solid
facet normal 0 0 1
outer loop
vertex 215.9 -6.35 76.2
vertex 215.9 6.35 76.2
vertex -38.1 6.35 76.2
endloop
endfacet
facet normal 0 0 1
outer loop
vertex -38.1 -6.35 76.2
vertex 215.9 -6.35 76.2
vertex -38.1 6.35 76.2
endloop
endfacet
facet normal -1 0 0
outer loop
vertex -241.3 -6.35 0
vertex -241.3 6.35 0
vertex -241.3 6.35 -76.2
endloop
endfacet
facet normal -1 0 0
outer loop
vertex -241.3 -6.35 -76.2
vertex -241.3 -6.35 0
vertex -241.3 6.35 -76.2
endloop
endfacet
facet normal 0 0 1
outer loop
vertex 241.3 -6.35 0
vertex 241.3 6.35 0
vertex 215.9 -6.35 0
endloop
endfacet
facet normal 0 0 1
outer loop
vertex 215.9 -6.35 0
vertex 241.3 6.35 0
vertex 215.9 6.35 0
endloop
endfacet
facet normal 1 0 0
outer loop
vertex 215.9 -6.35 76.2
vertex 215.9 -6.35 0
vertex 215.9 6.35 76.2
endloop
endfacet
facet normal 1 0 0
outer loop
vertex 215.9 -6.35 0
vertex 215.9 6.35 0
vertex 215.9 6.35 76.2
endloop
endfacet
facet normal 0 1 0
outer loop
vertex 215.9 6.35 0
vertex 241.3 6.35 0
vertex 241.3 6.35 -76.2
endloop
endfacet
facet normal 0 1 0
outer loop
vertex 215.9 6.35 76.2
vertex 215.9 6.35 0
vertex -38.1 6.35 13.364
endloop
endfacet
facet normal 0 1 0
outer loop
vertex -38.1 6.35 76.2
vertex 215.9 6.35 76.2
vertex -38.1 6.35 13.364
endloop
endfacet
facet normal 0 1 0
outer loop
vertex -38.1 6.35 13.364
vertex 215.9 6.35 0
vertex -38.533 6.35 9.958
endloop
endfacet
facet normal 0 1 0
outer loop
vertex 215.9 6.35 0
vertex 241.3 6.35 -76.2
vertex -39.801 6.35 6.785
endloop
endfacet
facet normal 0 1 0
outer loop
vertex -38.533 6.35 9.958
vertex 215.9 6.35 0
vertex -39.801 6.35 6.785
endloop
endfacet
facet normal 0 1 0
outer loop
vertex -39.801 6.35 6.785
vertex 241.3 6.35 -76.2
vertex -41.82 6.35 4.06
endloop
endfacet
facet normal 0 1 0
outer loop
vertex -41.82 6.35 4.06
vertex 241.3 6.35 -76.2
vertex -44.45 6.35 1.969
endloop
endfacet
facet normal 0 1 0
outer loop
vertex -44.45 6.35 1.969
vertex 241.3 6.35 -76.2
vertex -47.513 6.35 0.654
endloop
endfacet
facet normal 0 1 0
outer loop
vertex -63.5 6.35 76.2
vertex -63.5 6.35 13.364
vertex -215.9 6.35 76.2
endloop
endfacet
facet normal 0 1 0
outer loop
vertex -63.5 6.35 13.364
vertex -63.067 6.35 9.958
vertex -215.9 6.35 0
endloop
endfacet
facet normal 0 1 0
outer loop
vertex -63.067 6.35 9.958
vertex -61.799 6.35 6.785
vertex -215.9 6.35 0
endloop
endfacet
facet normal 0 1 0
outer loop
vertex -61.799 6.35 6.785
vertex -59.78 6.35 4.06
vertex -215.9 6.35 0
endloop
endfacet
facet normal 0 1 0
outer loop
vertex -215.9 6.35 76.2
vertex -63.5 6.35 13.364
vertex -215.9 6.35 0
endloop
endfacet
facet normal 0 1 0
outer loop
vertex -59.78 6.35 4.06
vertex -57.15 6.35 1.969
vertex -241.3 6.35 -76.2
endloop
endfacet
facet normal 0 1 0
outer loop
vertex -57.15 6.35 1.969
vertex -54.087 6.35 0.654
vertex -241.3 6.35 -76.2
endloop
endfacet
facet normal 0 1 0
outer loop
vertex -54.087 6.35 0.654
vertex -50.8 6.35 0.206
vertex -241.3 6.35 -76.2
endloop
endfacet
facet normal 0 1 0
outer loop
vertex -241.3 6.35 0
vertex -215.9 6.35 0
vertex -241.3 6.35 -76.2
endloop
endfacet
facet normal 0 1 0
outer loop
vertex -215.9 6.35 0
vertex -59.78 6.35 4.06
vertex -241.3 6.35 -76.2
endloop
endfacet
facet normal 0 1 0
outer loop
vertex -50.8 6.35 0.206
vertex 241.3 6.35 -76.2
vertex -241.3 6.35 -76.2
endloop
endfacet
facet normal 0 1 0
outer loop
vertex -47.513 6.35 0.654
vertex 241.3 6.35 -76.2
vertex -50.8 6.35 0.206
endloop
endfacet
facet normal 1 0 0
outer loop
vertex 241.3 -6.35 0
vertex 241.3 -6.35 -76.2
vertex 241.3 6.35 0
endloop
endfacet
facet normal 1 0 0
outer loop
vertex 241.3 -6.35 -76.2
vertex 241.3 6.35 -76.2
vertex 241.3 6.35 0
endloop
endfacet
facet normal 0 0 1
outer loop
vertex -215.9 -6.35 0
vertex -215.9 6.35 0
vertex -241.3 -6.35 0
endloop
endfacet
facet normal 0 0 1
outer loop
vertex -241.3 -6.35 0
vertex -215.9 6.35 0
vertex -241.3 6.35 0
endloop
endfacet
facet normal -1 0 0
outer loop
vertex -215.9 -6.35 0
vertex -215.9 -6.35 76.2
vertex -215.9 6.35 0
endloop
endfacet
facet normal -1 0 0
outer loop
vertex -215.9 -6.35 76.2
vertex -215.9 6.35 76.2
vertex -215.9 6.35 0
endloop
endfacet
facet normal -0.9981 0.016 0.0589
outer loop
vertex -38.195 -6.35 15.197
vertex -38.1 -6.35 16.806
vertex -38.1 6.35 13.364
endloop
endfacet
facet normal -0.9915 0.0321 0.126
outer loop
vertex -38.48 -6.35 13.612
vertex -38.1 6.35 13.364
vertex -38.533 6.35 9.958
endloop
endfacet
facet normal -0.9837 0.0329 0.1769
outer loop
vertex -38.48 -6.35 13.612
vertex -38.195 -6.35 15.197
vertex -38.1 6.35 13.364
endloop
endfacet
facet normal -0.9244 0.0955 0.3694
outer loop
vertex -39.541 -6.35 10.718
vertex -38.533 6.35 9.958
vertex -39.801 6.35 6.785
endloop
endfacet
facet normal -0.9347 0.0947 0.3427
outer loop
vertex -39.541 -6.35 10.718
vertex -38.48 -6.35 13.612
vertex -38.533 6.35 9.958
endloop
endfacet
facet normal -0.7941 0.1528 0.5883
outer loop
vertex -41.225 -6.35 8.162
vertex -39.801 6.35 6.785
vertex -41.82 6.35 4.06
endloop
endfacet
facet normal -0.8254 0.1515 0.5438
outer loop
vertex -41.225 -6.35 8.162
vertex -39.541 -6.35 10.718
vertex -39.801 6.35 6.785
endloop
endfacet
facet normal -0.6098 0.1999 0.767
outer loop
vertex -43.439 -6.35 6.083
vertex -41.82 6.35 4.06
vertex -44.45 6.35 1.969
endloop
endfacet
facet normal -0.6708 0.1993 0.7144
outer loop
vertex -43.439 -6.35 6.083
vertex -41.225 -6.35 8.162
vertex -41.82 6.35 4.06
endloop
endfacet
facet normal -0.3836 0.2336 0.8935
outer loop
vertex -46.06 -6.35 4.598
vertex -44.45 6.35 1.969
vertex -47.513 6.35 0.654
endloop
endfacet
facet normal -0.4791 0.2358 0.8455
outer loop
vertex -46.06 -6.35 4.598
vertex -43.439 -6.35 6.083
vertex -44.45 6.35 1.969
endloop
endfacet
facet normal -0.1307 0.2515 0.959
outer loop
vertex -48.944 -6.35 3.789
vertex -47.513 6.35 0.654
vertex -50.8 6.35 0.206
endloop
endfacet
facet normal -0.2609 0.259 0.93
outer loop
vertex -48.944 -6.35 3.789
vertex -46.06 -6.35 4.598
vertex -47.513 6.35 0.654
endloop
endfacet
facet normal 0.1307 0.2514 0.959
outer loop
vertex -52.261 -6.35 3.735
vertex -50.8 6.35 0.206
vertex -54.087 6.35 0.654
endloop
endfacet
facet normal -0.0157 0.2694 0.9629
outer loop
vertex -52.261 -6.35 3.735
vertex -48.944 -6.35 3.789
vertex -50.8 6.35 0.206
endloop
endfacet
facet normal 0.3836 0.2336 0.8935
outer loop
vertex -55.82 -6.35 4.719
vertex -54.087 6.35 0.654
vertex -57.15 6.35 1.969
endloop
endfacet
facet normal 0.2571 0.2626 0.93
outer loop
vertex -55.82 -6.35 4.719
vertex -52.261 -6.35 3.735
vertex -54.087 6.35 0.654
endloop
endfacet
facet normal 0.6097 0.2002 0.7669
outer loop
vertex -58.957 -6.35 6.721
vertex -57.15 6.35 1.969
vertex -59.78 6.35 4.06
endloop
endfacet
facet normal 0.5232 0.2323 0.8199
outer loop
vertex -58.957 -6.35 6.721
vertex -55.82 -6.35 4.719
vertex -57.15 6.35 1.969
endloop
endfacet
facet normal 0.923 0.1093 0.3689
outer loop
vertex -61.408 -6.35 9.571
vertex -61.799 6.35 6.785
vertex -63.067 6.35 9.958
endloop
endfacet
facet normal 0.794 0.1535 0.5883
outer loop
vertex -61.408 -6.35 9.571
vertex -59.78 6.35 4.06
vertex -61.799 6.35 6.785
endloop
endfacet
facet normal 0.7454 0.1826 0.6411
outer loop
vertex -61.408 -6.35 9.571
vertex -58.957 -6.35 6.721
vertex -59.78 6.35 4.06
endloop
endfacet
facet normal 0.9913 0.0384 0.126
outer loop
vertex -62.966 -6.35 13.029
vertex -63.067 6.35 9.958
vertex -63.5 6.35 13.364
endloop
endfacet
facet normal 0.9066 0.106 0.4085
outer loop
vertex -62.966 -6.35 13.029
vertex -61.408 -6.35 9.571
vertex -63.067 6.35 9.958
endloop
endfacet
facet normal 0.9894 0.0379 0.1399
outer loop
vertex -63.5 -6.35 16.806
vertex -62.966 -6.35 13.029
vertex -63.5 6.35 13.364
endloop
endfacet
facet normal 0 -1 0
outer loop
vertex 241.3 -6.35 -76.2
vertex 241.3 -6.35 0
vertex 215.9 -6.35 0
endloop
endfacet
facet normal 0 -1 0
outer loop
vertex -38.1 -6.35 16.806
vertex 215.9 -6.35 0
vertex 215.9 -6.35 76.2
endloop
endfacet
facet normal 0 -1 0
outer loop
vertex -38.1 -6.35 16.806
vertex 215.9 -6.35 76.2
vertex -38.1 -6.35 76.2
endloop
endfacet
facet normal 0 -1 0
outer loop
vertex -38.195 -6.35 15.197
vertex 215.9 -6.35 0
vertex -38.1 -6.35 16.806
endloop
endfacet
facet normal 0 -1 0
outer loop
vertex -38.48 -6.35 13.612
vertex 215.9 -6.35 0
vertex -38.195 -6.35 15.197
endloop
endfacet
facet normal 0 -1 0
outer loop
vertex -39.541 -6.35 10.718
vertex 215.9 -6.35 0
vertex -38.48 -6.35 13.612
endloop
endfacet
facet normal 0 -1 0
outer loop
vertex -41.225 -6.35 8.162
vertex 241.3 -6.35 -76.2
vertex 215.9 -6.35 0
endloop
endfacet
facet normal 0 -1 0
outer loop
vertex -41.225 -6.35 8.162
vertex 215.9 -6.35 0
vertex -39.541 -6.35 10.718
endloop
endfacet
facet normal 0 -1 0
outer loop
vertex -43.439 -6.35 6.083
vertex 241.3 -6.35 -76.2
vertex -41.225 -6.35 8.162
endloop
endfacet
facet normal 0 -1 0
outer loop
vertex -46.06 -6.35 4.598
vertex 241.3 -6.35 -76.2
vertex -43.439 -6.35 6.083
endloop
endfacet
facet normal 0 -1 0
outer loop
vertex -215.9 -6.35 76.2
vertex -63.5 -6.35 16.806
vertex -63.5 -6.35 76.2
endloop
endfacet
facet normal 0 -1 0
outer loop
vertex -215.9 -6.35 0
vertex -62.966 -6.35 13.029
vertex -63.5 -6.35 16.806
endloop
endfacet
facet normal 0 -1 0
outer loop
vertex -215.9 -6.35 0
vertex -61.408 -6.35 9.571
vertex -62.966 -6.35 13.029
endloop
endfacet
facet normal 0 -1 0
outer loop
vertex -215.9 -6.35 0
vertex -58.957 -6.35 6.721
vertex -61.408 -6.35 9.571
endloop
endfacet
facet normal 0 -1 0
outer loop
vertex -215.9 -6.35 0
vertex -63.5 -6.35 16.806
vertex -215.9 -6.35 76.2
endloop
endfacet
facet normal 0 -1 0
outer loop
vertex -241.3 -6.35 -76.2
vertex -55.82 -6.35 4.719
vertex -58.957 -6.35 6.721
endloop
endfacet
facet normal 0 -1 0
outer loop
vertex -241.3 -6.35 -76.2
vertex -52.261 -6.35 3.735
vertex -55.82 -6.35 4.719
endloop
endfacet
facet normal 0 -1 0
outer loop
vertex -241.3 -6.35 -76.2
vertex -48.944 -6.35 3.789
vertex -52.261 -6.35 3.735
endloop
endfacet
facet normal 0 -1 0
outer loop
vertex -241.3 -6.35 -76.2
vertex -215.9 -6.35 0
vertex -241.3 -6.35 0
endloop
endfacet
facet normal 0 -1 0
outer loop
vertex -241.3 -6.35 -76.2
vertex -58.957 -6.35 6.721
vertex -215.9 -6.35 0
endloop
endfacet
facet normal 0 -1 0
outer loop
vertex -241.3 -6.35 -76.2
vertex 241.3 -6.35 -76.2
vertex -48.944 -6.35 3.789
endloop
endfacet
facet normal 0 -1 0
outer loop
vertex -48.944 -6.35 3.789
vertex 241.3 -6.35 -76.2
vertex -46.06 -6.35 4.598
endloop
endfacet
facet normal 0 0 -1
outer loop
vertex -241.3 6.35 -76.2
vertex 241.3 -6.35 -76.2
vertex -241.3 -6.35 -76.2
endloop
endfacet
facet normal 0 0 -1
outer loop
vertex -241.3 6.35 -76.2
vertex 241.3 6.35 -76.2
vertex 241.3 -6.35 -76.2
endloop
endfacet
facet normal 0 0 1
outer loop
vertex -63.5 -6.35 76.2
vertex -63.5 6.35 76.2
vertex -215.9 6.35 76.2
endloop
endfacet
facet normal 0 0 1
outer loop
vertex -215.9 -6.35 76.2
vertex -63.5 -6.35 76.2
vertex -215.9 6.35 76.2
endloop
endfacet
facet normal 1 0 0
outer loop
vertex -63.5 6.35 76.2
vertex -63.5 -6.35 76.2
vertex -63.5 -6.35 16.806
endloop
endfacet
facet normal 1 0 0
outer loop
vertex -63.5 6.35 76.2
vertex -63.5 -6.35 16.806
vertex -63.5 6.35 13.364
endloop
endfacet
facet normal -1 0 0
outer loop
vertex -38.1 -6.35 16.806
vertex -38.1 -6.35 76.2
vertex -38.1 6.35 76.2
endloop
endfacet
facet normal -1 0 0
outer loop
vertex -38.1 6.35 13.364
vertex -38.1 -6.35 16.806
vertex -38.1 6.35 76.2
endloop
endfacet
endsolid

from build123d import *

# Parameters (mm, degrees)
BOSS_EXTRUDE1_DEPTH     = 6.35
CAVITY1_START           = -13.966782317
CAVITY1_OUTLINE_R       = 12.7
CAVITY1_DEPTH           = 20.041848041
CUT_EXTRUDE2_REACH      = 287.468
CUT_EXTRUDE2_END_RADIUS = 12.7
SKETCH6_W               = 25.4
SKETCH6_H               = 12.7


# Read off the part's stored shape, not the designer's step: Cavity1
with BuildPart() as part:
    # Sketch1 → Boss-Extrude1 (new, symmetric)
    with BuildSketch(Plane(origin=(0, 0, 0), x_dir=(1, 0, 0), z_dir=(0, 1, 0))):
        Polygon((-215.9, 76.2), (215.9, 76.2), (241.3, 76.2), (241.3, 0), (215.9, 0), (215.9, -76.2), (-215.9, -76.2), (-215.9, 0), (-241.3, 0), (-241.3, 76.2), align=None)
    extrude(amount=BOSS_EXTRUDE1_DEPTH, both=True)

    # Cavity1 outline → Cavity1 (cut)
    with BuildSketch(Plane(origin=(0, 0, 0), x_dir=(1, 0, 0), z_dir=(0, 0.9651827234760059, -0.261576585923588)).offset(CAVITY1_START)):
        with Locations((-50.8, -14.559690973)):
            Circle(CAVITY1_OUTLINE_R)
    extrude(amount=CAVITY1_DEPTH, mode=Mode.SUBTRACT)

    # Cut-Extrude2: up to this cylinder (the profile starts outside it)
    cut_extrude2_end = Plane(origin=(-50.8, -15.429678905, 19.266542232), z_dir=(0, 0.965182723476006, -0.2615765859235875)) * Cylinder(CUT_EXTRUDE2_END_RADIUS, 601.336, mode=Mode.PRIVATE)
    # Sketch6 → Cut-Extrude2 (cut, up to the surface)
    with BuildSketch(Plane.XY.offset(76.2), mode=Mode.PRIVATE) as cut_extrude2_sk1:
        with Locations((-50.8, 0)):
            Rectangle(SKETCH6_W, SKETCH6_H)
    cut_extrude2_tool1 = extrude(cut_extrude2_sk1.sketch, amount=-CUT_EXTRUDE2_REACH, mode=Mode.PRIVATE) - cut_extrude2_end
    add(cut_extrude2_tool1.solids().sort_by_distance((-50.8, 0, 76.2))[0], mode=Mode.SUBTRACT)


solid = part.part
